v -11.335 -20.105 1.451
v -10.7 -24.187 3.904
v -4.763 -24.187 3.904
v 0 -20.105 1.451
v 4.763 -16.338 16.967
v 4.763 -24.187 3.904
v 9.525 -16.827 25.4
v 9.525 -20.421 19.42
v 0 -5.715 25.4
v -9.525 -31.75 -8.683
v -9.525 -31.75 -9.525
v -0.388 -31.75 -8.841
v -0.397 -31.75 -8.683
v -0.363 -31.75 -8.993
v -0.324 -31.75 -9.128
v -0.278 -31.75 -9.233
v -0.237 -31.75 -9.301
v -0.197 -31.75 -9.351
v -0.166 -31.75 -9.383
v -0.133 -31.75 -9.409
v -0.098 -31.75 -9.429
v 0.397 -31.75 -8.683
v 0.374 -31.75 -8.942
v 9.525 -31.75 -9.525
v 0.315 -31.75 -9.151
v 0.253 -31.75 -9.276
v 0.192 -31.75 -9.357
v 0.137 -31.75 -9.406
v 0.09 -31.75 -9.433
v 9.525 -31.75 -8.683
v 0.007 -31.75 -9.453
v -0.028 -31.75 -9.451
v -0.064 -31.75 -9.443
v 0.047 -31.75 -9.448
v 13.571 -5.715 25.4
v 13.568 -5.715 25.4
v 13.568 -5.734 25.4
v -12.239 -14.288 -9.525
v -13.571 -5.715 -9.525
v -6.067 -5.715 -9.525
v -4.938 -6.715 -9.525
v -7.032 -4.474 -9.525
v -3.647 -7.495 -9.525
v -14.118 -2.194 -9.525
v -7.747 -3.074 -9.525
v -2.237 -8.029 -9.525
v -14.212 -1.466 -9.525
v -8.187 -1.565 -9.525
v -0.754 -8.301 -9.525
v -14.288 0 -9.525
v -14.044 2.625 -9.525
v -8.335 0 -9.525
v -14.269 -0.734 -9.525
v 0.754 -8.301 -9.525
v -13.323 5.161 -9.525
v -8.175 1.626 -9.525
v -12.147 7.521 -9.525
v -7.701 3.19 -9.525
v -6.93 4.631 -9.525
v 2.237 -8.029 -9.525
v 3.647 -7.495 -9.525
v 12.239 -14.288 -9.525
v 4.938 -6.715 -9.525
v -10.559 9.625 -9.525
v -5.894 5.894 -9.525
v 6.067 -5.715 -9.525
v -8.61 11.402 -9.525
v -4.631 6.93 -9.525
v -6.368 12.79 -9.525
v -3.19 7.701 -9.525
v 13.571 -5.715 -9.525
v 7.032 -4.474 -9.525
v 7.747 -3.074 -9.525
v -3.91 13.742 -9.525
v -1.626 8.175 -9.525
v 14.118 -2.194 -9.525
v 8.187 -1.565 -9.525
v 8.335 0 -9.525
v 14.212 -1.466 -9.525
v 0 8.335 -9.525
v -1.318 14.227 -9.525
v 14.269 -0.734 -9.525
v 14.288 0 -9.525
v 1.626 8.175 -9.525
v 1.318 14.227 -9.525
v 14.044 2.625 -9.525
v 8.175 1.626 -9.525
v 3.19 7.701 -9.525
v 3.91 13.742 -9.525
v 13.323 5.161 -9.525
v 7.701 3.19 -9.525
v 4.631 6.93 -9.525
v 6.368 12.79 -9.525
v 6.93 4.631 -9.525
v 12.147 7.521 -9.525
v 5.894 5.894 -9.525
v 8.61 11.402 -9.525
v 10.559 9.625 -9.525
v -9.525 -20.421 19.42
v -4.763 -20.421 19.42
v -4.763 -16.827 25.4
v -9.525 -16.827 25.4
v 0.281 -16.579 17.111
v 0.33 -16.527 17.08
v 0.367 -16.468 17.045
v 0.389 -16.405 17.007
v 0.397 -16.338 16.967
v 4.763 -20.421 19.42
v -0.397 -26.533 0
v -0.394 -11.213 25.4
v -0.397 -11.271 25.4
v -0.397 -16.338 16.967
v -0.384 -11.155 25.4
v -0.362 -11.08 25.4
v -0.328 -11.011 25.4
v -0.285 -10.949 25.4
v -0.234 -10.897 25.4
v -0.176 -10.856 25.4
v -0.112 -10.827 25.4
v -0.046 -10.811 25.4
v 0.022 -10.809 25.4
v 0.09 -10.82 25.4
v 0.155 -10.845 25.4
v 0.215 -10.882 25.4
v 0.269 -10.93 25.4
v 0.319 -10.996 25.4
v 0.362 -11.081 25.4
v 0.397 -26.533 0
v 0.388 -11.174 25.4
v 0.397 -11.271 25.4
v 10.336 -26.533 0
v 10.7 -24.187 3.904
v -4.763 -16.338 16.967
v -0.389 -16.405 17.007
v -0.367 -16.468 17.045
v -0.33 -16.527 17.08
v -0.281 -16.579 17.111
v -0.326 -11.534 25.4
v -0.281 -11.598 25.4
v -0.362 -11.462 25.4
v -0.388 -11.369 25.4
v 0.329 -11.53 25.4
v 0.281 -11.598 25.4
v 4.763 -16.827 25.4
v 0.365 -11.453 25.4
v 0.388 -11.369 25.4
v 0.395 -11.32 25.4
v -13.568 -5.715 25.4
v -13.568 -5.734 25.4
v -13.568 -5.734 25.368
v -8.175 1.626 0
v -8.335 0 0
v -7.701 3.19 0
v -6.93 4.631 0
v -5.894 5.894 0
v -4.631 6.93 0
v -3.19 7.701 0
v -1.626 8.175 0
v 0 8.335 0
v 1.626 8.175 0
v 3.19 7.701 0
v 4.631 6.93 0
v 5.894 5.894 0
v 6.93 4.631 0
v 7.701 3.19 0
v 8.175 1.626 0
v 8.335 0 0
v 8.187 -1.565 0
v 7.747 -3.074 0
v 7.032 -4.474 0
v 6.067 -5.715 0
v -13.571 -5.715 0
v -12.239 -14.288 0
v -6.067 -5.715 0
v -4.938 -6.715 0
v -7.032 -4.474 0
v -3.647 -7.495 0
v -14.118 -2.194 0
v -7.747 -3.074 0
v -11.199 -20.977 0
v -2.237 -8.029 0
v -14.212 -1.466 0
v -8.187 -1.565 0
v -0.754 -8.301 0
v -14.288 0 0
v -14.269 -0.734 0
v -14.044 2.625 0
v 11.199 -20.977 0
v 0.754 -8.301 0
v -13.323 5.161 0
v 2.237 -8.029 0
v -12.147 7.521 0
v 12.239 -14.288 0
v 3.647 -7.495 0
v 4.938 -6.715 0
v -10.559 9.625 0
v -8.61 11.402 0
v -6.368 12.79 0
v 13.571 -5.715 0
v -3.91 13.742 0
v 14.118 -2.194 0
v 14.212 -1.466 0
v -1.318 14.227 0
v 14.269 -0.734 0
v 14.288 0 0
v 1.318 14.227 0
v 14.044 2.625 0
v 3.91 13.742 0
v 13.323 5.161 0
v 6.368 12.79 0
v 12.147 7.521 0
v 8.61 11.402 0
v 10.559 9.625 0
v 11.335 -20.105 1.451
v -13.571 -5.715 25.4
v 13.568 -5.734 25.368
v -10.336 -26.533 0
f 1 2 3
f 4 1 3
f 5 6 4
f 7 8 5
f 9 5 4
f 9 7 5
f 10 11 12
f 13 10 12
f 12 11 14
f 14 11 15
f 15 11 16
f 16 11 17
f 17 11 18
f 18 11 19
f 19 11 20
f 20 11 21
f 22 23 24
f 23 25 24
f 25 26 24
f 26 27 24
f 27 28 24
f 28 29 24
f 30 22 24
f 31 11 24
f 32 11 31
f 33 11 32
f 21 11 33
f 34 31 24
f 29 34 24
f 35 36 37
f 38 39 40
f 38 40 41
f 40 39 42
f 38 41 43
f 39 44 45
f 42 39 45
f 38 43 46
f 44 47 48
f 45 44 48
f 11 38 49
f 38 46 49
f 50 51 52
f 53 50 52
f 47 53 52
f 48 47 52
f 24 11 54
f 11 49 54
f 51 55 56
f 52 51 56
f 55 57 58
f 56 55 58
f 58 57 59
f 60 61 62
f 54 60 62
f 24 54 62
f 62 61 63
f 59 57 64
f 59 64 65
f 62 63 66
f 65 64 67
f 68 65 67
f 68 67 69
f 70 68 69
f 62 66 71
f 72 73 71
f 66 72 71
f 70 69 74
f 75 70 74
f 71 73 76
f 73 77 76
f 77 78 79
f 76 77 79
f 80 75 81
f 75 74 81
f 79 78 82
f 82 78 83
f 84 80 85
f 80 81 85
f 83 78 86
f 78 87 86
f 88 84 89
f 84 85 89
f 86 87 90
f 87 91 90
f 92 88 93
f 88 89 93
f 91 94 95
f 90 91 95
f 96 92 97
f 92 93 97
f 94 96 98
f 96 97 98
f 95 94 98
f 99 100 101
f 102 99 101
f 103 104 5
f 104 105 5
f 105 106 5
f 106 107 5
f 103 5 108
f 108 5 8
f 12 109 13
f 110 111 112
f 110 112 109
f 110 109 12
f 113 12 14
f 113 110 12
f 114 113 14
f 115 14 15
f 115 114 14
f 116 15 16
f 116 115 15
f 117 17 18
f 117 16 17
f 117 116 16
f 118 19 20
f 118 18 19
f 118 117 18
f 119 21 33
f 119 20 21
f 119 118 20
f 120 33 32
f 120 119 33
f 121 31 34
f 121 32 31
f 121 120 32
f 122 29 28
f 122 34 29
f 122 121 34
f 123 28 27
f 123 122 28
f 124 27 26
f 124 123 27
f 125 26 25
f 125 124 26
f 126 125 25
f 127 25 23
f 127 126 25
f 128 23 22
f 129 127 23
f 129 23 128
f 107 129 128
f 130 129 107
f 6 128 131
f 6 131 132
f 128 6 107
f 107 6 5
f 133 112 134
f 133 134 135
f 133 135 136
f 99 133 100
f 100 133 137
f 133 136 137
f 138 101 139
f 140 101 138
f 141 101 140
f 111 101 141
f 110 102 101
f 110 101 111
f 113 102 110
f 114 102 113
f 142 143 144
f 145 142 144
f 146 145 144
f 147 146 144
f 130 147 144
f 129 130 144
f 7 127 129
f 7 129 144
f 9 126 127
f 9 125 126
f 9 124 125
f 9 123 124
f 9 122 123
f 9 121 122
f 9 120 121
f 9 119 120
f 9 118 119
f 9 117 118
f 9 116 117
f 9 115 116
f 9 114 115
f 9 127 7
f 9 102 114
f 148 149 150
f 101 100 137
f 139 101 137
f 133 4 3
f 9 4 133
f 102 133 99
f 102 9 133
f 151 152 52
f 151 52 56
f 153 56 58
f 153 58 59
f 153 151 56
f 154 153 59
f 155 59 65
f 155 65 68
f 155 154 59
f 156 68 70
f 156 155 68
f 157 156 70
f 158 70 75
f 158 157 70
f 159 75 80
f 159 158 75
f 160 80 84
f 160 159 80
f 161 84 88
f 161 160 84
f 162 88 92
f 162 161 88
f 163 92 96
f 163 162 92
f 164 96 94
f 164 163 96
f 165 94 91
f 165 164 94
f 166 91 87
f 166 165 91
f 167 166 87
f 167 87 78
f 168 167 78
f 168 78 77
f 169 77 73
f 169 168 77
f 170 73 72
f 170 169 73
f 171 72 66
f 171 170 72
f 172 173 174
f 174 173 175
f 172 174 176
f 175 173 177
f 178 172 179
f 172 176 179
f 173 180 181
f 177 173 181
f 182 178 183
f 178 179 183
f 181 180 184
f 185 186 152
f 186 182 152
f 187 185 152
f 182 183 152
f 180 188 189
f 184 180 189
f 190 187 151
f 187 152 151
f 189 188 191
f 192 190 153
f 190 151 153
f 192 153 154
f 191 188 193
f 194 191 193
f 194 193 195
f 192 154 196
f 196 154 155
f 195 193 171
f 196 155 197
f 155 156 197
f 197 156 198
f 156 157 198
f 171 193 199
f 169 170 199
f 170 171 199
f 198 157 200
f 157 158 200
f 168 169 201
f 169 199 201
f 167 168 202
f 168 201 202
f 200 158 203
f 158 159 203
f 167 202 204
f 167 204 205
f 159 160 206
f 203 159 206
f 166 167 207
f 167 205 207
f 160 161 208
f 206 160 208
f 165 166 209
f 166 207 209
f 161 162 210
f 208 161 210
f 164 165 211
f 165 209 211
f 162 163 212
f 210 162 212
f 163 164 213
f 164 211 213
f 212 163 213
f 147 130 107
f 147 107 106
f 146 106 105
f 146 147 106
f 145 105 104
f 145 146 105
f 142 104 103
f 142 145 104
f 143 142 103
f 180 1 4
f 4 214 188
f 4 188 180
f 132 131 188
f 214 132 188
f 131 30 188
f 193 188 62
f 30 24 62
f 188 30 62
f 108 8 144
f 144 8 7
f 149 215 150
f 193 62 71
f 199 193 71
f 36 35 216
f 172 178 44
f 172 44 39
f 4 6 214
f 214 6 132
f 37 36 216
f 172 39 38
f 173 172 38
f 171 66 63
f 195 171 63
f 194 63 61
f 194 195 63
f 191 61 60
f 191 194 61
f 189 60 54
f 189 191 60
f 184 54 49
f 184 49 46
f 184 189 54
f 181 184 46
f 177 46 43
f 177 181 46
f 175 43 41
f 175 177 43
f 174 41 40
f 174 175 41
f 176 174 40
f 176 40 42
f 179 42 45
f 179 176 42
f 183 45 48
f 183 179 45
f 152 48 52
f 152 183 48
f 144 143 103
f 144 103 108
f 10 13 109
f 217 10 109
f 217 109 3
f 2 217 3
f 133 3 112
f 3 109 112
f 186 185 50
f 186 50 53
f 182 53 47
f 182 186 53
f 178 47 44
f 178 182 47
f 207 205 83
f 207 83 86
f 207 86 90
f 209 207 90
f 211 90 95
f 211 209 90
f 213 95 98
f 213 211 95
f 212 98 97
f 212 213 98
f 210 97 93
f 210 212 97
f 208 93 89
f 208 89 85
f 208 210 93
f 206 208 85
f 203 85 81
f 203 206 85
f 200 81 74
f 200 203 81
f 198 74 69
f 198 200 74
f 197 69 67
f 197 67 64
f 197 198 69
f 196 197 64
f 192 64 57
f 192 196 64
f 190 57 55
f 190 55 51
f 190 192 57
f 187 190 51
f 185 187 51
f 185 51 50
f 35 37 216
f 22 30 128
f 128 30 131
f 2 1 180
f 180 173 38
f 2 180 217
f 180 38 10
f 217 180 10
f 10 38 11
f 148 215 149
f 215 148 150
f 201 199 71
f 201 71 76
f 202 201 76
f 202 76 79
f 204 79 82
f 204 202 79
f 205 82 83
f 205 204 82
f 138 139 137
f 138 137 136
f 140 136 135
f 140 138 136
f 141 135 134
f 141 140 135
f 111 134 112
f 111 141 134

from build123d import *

# Parameters (mm, degrees)
F1_DEPTH = 9.525
F2_DEPTH = 25.4
F5_DEPTH = 28.576
F8_DEPTH = 43.3465842573
F9_DEPTH = 27.94


with BuildPart() as f1:
    # F0 (on Top) → F1 (new body)
    with BuildSketch(Plane.XY):
        with BuildLine():
            ThreePointArc((-8.33501, 0), (0, 8.33501), (8.33501, 0))
            Line((8.33501, 0), (14.2875, 0))
            ThreePointArc((14.2875, 0), (0, 14.2875), (-14.2875, 0))
            Line((-14.2875, 0), (-8.33501, 0))
        make_face()
        with BuildLine():
            ThreePointArc((-6.0672206734, -5.715), (-7.7473458902, -3.0742516744), (-8.33501, 0))
            Line((-8.33501, 0), (-14.2875, 0))
            ThreePointArc((-14.2875, 0), (-14.2450732062, -1.1002479715), (-14.1180447981, -2.1939615606))
            ThreePointArc((-14.1180447981, -2.1939615606), (-13.7198008187, -3.9874455161), (-13.0947100483, -5.715))
            Line((-13.0947100483, -5.715), (-6.0672206734, -5.715))
        make_face()
        with BuildLine():
            Line((13.0947100483, -5.715), (6.0672206734, -5.715))
            ThreePointArc((6.0672206734, -5.715), (0, -8.33501), (-6.0672206734, -5.715))
            Line((-6.0672206734, -5.715), (-13.0947100483, -5.715))
            ThreePointArc((-13.0947100483, -5.715), (-7.8255860404, -11.9537801291), (0, -14.2875))
            ThreePointArc((0, -14.2875), (7.8255860404, -11.9537801291), (13.0947100483, -5.715))
        make_face()
        with BuildLine():
            Line((14.2875, 0), (8.33501, 0))
            ThreePointArc((8.33501, 0), (7.7473458902, -3.0742516744), (6.0672206734, -5.715))
            Line((6.0672206734, -5.715), (13.0947100483, -5.715))
            ThreePointArc((13.0947100483, -5.715), (13.7198008187, -3.9874455161), (14.1180447981, -2.1939615606))
            ThreePointArc((14.1180447981, -2.1939615606), (14.2450732062, -1.1002479715), (14.2875, 0))
        make_face()
        with BuildLine():
            ThreePointArc((0, -14.2875), (-7.8255860404, -11.9537801291), (-13.0947100483, -5.715))
            Line((-13.0947100483, -5.715), (-13.5708710853, -5.715))
            Line((-13.5708710853, -5.715), (-12.2386940206, -14.2875))
            Line((-12.2386940206, -14.2875), (0, -14.2875))
        make_face()
        with BuildLine():
            Line((13.5708710853, -5.715), (13.0947100483, -5.715))
            ThreePointArc((13.0947100483, -5.715), (7.8255860404, -11.9537801291), (0, -14.2875))
            Line((0, -14.2875), (12.2386940206, -14.2875))
            Line((12.2386940206, -14.2875), (13.5708710853, -5.715))
        make_face()
        Polygon((12.2386940206, -14.2875), (0, -14.2875), (-12.2386940206, -14.2875), (-9.525, -31.75), (0, -31.75), (9.525, -31.75), align=None)
        with BuildLine():
            Line((-13.5708710853, -5.715), (-13.0947100483, -5.715))
            ThreePointArc((-13.0947100483, -5.715), (-13.7198008187, -3.9874455161), (-14.1180447981, -2.1939615606))
            Line((-14.1180447981, -2.1939615606), (-13.5708710853, -5.715))
        make_face()
        with BuildLine():
            ThreePointArc((14.1180447981, -2.1939615606), (13.7198008187, -3.9874455161), (13.0947100483, -5.715))
            Line((13.0947100483, -5.715), (13.5708710853, -5.715))
            Line((13.5708710853, -5.715), (14.1180447981, -2.1939615606))
        make_face()
    extrude(amount=-F1_DEPTH)

    # F0 (on Top) → F2 (join)
    with BuildSketch(Plane.XY):
        with BuildLine():
            ThreePointArc((0, -14.2875), (-7.8255860404, -11.9537801291), (-13.0947100483, -5.715))
            Line((-13.0947100483, -5.715), (-13.5708710853, -5.715))
            Line((-13.5708710853, -5.715), (-12.2386940206, -14.2875))
            Line((-12.2386940206, -14.2875), (0, -14.2875))
        make_face()
        with BuildLine():
            Line((13.5708710853, -5.715), (13.0947100483, -5.715))
            ThreePointArc((13.0947100483, -5.715), (7.8255860404, -11.9537801291), (0, -14.2875))
            Line((0, -14.2875), (12.2386940206, -14.2875))
            Line((12.2386940206, -14.2875), (13.5708710853, -5.715))
        make_face()
        Polygon((12.2386940206, -14.2875), (0, -14.2875), (-12.2386940206, -14.2875), (-9.525, -31.75), (0, -31.75), (9.525, -31.75), align=None)
        with BuildLine():
            Line((13.0947100483, -5.715), (6.0672206734, -5.715))
            ThreePointArc((6.0672206734, -5.715), (0, -8.33501), (-6.0672206734, -5.715))
            Line((-6.0672206734, -5.715), (-13.0947100483, -5.715))
            ThreePointArc((-13.0947100483, -5.715), (-7.8255860404, -11.9537801291), (0, -14.2875))
            ThreePointArc((0, -14.2875), (7.8255860404, -11.9537801291), (13.0947100483, -5.715))
        make_face()
        with BuildLine():
            ThreePointArc((-6.0672206734, -5.715), (0, -8.33501), (6.0672206734, -5.715))
            Line((6.0672206734, -5.715), (0, -5.715))
            Line((0, -5.715), (-6.0672206734, -5.715))
        make_face()
    extrude(amount=F2_DEPTH)

    # F4 (on offset) → F5 (cut, through all)
    with BuildSketch(Plane.YZ.offset(14.2875)):
        Polygon((-32.0890428318, 0), (-20.4205020905, 19.4197129446), (-16.8271831085, 25.4), (-32.0890428318, 25.4), align=None)
        Polygon((-20.9768597233, 0), (-5.715, 0), (-5.715, 25.4), (-12.2559835514, 14.5139752811), align=None)
        Polygon((-26.5329512775, 0), (-16.338242821, 16.9668441128), (-20.4205020905, 19.4197129446), (-32.0890428318, 0), (-37.812240228, -9.525), (-32.2561486738, -9.525), align=None)
    extrude(amount=-F5_DEPTH, mode=Mode.SUBTRACT)

    # F7 (on face) → F8 (cut, through all)
    with BuildSketch(Plane(origin=(0, 9.69744942, 16.1392661008), x_dir=(1, 0, 0), z_dir=(0, -0.5150380749, -0.8571673007))):
        with BuildLine():
            Line((0.2806330038, 23.02381123), (4.7625, 27.5056782262))
            Line((4.7625, 27.5056782262), (0, 27.5056782262))
            Line((0, 27.5056782262), (-4.7625, 27.5056782262))
            Line((-4.7625, 27.5056782262), (-0.2806330038, 23.02381123))
            ThreePointArc((-0.2806330038, 23.02381123), (0, 23.1400532262), (0.2806330038, 23.02381123))
        make_face()
        with BuildLine():
            ThreePointArc((-0.2806330038, 23.02381123), (-0.3666646895, 22.8950557134), (-0.396875, 22.7431782262))
            Line((-0.396875, 22.7431782262), (0, 22.7431782262))
            Line((0, 22.7431782262), (-0.2806330038, 23.02381123))
        make_face()
        with BuildLine():
            Line((0, 22.7431782262), (0.396875, 22.7431782262))
            ThreePointArc((0.396875, 22.7431782262), (0.3666646895, 22.8950557134), (0.2806330038, 23.02381123))
            Line((0.2806330038, 23.02381123), (0, 22.7431782262))
        make_face()
        with BuildLine():
            Line((-0.2806330038, 23.02381123), (0, 22.7431782262))
            Line((0, 22.7431782262), (0.2806330038, 23.02381123))
            ThreePointArc((0.2806330038, 23.02381123), (0, 23.1400532262), (-0.2806330038, 23.02381123))
        make_face()
        with BuildLine():
            ThreePointArc((-0.396875, 22.7431782262), (0, 22.3463032262), (0.396875, 22.7431782262))
            Line((0.396875, 22.7431782262), (0, 22.7431782262))
            Line((0, 22.7431782262), (-0.396875, 22.7431782262))
        make_face()
    extrude(amount=F8_DEPTH, mode=Mode.SUBTRACT)

    # F7 (on face) → F9 (cut)
    with BuildSketch(Plane(origin=(0, 9.69744942, 16.1392661008), x_dir=(1, 0, 0), z_dir=(0, -0.5150380749, -0.8571673007))):
        Polygon((9.525, 27.5056782262), (4.7625, 22.7431782262), (9.2526280605, 22.7431782262), (13.5678891093, 27.0584392749), (14.0151280605, 27.5056782262), align=None)
        Polygon((9.2526280605, 22.7431782262), (4.4901280605, 17.9806782262), (13.5678891093, 17.9806782262), (13.5678891093, 22.7431782262), align=None)
        Polygon((-13.5678891093, 17.9806782262), (-4.4901280605, 17.9806782262), (-9.2526280605, 22.7431782262), (-13.5678891093, 22.7431782262), align=None)
        Polygon((13.5678891093, 27.0584392749), (9.2526280605, 22.7431782262), (13.5678891093, 22.7431782262), align=None)
        Polygon((-9.2526280605, 22.7431782262), (-4.7625, 22.7431782262), (-9.525, 27.5056782262), (-14.0151280605, 27.5056782262), (-13.5678891093, 27.0584392749), align=None)
        Polygon((-13.5678891093, 22.7431782262), (-9.2526280605, 22.7431782262), (-13.5678891093, 27.0584392749), align=None)
        Polygon((4.7625, 22.7431782262), (0, 17.9806782262), (4.4901280605, 17.9806782262), (9.2526280605, 22.7431782262), align=None)
        Polygon((-4.4901280605, 17.9806782262), (0, 17.9806782262), (-4.7625, 22.7431782262), (-9.2526280605, 22.7431782262), align=None)
    extrude(amount=F9_DEPTH, mode=Mode.SUBTRACT)


solid = f1.part
